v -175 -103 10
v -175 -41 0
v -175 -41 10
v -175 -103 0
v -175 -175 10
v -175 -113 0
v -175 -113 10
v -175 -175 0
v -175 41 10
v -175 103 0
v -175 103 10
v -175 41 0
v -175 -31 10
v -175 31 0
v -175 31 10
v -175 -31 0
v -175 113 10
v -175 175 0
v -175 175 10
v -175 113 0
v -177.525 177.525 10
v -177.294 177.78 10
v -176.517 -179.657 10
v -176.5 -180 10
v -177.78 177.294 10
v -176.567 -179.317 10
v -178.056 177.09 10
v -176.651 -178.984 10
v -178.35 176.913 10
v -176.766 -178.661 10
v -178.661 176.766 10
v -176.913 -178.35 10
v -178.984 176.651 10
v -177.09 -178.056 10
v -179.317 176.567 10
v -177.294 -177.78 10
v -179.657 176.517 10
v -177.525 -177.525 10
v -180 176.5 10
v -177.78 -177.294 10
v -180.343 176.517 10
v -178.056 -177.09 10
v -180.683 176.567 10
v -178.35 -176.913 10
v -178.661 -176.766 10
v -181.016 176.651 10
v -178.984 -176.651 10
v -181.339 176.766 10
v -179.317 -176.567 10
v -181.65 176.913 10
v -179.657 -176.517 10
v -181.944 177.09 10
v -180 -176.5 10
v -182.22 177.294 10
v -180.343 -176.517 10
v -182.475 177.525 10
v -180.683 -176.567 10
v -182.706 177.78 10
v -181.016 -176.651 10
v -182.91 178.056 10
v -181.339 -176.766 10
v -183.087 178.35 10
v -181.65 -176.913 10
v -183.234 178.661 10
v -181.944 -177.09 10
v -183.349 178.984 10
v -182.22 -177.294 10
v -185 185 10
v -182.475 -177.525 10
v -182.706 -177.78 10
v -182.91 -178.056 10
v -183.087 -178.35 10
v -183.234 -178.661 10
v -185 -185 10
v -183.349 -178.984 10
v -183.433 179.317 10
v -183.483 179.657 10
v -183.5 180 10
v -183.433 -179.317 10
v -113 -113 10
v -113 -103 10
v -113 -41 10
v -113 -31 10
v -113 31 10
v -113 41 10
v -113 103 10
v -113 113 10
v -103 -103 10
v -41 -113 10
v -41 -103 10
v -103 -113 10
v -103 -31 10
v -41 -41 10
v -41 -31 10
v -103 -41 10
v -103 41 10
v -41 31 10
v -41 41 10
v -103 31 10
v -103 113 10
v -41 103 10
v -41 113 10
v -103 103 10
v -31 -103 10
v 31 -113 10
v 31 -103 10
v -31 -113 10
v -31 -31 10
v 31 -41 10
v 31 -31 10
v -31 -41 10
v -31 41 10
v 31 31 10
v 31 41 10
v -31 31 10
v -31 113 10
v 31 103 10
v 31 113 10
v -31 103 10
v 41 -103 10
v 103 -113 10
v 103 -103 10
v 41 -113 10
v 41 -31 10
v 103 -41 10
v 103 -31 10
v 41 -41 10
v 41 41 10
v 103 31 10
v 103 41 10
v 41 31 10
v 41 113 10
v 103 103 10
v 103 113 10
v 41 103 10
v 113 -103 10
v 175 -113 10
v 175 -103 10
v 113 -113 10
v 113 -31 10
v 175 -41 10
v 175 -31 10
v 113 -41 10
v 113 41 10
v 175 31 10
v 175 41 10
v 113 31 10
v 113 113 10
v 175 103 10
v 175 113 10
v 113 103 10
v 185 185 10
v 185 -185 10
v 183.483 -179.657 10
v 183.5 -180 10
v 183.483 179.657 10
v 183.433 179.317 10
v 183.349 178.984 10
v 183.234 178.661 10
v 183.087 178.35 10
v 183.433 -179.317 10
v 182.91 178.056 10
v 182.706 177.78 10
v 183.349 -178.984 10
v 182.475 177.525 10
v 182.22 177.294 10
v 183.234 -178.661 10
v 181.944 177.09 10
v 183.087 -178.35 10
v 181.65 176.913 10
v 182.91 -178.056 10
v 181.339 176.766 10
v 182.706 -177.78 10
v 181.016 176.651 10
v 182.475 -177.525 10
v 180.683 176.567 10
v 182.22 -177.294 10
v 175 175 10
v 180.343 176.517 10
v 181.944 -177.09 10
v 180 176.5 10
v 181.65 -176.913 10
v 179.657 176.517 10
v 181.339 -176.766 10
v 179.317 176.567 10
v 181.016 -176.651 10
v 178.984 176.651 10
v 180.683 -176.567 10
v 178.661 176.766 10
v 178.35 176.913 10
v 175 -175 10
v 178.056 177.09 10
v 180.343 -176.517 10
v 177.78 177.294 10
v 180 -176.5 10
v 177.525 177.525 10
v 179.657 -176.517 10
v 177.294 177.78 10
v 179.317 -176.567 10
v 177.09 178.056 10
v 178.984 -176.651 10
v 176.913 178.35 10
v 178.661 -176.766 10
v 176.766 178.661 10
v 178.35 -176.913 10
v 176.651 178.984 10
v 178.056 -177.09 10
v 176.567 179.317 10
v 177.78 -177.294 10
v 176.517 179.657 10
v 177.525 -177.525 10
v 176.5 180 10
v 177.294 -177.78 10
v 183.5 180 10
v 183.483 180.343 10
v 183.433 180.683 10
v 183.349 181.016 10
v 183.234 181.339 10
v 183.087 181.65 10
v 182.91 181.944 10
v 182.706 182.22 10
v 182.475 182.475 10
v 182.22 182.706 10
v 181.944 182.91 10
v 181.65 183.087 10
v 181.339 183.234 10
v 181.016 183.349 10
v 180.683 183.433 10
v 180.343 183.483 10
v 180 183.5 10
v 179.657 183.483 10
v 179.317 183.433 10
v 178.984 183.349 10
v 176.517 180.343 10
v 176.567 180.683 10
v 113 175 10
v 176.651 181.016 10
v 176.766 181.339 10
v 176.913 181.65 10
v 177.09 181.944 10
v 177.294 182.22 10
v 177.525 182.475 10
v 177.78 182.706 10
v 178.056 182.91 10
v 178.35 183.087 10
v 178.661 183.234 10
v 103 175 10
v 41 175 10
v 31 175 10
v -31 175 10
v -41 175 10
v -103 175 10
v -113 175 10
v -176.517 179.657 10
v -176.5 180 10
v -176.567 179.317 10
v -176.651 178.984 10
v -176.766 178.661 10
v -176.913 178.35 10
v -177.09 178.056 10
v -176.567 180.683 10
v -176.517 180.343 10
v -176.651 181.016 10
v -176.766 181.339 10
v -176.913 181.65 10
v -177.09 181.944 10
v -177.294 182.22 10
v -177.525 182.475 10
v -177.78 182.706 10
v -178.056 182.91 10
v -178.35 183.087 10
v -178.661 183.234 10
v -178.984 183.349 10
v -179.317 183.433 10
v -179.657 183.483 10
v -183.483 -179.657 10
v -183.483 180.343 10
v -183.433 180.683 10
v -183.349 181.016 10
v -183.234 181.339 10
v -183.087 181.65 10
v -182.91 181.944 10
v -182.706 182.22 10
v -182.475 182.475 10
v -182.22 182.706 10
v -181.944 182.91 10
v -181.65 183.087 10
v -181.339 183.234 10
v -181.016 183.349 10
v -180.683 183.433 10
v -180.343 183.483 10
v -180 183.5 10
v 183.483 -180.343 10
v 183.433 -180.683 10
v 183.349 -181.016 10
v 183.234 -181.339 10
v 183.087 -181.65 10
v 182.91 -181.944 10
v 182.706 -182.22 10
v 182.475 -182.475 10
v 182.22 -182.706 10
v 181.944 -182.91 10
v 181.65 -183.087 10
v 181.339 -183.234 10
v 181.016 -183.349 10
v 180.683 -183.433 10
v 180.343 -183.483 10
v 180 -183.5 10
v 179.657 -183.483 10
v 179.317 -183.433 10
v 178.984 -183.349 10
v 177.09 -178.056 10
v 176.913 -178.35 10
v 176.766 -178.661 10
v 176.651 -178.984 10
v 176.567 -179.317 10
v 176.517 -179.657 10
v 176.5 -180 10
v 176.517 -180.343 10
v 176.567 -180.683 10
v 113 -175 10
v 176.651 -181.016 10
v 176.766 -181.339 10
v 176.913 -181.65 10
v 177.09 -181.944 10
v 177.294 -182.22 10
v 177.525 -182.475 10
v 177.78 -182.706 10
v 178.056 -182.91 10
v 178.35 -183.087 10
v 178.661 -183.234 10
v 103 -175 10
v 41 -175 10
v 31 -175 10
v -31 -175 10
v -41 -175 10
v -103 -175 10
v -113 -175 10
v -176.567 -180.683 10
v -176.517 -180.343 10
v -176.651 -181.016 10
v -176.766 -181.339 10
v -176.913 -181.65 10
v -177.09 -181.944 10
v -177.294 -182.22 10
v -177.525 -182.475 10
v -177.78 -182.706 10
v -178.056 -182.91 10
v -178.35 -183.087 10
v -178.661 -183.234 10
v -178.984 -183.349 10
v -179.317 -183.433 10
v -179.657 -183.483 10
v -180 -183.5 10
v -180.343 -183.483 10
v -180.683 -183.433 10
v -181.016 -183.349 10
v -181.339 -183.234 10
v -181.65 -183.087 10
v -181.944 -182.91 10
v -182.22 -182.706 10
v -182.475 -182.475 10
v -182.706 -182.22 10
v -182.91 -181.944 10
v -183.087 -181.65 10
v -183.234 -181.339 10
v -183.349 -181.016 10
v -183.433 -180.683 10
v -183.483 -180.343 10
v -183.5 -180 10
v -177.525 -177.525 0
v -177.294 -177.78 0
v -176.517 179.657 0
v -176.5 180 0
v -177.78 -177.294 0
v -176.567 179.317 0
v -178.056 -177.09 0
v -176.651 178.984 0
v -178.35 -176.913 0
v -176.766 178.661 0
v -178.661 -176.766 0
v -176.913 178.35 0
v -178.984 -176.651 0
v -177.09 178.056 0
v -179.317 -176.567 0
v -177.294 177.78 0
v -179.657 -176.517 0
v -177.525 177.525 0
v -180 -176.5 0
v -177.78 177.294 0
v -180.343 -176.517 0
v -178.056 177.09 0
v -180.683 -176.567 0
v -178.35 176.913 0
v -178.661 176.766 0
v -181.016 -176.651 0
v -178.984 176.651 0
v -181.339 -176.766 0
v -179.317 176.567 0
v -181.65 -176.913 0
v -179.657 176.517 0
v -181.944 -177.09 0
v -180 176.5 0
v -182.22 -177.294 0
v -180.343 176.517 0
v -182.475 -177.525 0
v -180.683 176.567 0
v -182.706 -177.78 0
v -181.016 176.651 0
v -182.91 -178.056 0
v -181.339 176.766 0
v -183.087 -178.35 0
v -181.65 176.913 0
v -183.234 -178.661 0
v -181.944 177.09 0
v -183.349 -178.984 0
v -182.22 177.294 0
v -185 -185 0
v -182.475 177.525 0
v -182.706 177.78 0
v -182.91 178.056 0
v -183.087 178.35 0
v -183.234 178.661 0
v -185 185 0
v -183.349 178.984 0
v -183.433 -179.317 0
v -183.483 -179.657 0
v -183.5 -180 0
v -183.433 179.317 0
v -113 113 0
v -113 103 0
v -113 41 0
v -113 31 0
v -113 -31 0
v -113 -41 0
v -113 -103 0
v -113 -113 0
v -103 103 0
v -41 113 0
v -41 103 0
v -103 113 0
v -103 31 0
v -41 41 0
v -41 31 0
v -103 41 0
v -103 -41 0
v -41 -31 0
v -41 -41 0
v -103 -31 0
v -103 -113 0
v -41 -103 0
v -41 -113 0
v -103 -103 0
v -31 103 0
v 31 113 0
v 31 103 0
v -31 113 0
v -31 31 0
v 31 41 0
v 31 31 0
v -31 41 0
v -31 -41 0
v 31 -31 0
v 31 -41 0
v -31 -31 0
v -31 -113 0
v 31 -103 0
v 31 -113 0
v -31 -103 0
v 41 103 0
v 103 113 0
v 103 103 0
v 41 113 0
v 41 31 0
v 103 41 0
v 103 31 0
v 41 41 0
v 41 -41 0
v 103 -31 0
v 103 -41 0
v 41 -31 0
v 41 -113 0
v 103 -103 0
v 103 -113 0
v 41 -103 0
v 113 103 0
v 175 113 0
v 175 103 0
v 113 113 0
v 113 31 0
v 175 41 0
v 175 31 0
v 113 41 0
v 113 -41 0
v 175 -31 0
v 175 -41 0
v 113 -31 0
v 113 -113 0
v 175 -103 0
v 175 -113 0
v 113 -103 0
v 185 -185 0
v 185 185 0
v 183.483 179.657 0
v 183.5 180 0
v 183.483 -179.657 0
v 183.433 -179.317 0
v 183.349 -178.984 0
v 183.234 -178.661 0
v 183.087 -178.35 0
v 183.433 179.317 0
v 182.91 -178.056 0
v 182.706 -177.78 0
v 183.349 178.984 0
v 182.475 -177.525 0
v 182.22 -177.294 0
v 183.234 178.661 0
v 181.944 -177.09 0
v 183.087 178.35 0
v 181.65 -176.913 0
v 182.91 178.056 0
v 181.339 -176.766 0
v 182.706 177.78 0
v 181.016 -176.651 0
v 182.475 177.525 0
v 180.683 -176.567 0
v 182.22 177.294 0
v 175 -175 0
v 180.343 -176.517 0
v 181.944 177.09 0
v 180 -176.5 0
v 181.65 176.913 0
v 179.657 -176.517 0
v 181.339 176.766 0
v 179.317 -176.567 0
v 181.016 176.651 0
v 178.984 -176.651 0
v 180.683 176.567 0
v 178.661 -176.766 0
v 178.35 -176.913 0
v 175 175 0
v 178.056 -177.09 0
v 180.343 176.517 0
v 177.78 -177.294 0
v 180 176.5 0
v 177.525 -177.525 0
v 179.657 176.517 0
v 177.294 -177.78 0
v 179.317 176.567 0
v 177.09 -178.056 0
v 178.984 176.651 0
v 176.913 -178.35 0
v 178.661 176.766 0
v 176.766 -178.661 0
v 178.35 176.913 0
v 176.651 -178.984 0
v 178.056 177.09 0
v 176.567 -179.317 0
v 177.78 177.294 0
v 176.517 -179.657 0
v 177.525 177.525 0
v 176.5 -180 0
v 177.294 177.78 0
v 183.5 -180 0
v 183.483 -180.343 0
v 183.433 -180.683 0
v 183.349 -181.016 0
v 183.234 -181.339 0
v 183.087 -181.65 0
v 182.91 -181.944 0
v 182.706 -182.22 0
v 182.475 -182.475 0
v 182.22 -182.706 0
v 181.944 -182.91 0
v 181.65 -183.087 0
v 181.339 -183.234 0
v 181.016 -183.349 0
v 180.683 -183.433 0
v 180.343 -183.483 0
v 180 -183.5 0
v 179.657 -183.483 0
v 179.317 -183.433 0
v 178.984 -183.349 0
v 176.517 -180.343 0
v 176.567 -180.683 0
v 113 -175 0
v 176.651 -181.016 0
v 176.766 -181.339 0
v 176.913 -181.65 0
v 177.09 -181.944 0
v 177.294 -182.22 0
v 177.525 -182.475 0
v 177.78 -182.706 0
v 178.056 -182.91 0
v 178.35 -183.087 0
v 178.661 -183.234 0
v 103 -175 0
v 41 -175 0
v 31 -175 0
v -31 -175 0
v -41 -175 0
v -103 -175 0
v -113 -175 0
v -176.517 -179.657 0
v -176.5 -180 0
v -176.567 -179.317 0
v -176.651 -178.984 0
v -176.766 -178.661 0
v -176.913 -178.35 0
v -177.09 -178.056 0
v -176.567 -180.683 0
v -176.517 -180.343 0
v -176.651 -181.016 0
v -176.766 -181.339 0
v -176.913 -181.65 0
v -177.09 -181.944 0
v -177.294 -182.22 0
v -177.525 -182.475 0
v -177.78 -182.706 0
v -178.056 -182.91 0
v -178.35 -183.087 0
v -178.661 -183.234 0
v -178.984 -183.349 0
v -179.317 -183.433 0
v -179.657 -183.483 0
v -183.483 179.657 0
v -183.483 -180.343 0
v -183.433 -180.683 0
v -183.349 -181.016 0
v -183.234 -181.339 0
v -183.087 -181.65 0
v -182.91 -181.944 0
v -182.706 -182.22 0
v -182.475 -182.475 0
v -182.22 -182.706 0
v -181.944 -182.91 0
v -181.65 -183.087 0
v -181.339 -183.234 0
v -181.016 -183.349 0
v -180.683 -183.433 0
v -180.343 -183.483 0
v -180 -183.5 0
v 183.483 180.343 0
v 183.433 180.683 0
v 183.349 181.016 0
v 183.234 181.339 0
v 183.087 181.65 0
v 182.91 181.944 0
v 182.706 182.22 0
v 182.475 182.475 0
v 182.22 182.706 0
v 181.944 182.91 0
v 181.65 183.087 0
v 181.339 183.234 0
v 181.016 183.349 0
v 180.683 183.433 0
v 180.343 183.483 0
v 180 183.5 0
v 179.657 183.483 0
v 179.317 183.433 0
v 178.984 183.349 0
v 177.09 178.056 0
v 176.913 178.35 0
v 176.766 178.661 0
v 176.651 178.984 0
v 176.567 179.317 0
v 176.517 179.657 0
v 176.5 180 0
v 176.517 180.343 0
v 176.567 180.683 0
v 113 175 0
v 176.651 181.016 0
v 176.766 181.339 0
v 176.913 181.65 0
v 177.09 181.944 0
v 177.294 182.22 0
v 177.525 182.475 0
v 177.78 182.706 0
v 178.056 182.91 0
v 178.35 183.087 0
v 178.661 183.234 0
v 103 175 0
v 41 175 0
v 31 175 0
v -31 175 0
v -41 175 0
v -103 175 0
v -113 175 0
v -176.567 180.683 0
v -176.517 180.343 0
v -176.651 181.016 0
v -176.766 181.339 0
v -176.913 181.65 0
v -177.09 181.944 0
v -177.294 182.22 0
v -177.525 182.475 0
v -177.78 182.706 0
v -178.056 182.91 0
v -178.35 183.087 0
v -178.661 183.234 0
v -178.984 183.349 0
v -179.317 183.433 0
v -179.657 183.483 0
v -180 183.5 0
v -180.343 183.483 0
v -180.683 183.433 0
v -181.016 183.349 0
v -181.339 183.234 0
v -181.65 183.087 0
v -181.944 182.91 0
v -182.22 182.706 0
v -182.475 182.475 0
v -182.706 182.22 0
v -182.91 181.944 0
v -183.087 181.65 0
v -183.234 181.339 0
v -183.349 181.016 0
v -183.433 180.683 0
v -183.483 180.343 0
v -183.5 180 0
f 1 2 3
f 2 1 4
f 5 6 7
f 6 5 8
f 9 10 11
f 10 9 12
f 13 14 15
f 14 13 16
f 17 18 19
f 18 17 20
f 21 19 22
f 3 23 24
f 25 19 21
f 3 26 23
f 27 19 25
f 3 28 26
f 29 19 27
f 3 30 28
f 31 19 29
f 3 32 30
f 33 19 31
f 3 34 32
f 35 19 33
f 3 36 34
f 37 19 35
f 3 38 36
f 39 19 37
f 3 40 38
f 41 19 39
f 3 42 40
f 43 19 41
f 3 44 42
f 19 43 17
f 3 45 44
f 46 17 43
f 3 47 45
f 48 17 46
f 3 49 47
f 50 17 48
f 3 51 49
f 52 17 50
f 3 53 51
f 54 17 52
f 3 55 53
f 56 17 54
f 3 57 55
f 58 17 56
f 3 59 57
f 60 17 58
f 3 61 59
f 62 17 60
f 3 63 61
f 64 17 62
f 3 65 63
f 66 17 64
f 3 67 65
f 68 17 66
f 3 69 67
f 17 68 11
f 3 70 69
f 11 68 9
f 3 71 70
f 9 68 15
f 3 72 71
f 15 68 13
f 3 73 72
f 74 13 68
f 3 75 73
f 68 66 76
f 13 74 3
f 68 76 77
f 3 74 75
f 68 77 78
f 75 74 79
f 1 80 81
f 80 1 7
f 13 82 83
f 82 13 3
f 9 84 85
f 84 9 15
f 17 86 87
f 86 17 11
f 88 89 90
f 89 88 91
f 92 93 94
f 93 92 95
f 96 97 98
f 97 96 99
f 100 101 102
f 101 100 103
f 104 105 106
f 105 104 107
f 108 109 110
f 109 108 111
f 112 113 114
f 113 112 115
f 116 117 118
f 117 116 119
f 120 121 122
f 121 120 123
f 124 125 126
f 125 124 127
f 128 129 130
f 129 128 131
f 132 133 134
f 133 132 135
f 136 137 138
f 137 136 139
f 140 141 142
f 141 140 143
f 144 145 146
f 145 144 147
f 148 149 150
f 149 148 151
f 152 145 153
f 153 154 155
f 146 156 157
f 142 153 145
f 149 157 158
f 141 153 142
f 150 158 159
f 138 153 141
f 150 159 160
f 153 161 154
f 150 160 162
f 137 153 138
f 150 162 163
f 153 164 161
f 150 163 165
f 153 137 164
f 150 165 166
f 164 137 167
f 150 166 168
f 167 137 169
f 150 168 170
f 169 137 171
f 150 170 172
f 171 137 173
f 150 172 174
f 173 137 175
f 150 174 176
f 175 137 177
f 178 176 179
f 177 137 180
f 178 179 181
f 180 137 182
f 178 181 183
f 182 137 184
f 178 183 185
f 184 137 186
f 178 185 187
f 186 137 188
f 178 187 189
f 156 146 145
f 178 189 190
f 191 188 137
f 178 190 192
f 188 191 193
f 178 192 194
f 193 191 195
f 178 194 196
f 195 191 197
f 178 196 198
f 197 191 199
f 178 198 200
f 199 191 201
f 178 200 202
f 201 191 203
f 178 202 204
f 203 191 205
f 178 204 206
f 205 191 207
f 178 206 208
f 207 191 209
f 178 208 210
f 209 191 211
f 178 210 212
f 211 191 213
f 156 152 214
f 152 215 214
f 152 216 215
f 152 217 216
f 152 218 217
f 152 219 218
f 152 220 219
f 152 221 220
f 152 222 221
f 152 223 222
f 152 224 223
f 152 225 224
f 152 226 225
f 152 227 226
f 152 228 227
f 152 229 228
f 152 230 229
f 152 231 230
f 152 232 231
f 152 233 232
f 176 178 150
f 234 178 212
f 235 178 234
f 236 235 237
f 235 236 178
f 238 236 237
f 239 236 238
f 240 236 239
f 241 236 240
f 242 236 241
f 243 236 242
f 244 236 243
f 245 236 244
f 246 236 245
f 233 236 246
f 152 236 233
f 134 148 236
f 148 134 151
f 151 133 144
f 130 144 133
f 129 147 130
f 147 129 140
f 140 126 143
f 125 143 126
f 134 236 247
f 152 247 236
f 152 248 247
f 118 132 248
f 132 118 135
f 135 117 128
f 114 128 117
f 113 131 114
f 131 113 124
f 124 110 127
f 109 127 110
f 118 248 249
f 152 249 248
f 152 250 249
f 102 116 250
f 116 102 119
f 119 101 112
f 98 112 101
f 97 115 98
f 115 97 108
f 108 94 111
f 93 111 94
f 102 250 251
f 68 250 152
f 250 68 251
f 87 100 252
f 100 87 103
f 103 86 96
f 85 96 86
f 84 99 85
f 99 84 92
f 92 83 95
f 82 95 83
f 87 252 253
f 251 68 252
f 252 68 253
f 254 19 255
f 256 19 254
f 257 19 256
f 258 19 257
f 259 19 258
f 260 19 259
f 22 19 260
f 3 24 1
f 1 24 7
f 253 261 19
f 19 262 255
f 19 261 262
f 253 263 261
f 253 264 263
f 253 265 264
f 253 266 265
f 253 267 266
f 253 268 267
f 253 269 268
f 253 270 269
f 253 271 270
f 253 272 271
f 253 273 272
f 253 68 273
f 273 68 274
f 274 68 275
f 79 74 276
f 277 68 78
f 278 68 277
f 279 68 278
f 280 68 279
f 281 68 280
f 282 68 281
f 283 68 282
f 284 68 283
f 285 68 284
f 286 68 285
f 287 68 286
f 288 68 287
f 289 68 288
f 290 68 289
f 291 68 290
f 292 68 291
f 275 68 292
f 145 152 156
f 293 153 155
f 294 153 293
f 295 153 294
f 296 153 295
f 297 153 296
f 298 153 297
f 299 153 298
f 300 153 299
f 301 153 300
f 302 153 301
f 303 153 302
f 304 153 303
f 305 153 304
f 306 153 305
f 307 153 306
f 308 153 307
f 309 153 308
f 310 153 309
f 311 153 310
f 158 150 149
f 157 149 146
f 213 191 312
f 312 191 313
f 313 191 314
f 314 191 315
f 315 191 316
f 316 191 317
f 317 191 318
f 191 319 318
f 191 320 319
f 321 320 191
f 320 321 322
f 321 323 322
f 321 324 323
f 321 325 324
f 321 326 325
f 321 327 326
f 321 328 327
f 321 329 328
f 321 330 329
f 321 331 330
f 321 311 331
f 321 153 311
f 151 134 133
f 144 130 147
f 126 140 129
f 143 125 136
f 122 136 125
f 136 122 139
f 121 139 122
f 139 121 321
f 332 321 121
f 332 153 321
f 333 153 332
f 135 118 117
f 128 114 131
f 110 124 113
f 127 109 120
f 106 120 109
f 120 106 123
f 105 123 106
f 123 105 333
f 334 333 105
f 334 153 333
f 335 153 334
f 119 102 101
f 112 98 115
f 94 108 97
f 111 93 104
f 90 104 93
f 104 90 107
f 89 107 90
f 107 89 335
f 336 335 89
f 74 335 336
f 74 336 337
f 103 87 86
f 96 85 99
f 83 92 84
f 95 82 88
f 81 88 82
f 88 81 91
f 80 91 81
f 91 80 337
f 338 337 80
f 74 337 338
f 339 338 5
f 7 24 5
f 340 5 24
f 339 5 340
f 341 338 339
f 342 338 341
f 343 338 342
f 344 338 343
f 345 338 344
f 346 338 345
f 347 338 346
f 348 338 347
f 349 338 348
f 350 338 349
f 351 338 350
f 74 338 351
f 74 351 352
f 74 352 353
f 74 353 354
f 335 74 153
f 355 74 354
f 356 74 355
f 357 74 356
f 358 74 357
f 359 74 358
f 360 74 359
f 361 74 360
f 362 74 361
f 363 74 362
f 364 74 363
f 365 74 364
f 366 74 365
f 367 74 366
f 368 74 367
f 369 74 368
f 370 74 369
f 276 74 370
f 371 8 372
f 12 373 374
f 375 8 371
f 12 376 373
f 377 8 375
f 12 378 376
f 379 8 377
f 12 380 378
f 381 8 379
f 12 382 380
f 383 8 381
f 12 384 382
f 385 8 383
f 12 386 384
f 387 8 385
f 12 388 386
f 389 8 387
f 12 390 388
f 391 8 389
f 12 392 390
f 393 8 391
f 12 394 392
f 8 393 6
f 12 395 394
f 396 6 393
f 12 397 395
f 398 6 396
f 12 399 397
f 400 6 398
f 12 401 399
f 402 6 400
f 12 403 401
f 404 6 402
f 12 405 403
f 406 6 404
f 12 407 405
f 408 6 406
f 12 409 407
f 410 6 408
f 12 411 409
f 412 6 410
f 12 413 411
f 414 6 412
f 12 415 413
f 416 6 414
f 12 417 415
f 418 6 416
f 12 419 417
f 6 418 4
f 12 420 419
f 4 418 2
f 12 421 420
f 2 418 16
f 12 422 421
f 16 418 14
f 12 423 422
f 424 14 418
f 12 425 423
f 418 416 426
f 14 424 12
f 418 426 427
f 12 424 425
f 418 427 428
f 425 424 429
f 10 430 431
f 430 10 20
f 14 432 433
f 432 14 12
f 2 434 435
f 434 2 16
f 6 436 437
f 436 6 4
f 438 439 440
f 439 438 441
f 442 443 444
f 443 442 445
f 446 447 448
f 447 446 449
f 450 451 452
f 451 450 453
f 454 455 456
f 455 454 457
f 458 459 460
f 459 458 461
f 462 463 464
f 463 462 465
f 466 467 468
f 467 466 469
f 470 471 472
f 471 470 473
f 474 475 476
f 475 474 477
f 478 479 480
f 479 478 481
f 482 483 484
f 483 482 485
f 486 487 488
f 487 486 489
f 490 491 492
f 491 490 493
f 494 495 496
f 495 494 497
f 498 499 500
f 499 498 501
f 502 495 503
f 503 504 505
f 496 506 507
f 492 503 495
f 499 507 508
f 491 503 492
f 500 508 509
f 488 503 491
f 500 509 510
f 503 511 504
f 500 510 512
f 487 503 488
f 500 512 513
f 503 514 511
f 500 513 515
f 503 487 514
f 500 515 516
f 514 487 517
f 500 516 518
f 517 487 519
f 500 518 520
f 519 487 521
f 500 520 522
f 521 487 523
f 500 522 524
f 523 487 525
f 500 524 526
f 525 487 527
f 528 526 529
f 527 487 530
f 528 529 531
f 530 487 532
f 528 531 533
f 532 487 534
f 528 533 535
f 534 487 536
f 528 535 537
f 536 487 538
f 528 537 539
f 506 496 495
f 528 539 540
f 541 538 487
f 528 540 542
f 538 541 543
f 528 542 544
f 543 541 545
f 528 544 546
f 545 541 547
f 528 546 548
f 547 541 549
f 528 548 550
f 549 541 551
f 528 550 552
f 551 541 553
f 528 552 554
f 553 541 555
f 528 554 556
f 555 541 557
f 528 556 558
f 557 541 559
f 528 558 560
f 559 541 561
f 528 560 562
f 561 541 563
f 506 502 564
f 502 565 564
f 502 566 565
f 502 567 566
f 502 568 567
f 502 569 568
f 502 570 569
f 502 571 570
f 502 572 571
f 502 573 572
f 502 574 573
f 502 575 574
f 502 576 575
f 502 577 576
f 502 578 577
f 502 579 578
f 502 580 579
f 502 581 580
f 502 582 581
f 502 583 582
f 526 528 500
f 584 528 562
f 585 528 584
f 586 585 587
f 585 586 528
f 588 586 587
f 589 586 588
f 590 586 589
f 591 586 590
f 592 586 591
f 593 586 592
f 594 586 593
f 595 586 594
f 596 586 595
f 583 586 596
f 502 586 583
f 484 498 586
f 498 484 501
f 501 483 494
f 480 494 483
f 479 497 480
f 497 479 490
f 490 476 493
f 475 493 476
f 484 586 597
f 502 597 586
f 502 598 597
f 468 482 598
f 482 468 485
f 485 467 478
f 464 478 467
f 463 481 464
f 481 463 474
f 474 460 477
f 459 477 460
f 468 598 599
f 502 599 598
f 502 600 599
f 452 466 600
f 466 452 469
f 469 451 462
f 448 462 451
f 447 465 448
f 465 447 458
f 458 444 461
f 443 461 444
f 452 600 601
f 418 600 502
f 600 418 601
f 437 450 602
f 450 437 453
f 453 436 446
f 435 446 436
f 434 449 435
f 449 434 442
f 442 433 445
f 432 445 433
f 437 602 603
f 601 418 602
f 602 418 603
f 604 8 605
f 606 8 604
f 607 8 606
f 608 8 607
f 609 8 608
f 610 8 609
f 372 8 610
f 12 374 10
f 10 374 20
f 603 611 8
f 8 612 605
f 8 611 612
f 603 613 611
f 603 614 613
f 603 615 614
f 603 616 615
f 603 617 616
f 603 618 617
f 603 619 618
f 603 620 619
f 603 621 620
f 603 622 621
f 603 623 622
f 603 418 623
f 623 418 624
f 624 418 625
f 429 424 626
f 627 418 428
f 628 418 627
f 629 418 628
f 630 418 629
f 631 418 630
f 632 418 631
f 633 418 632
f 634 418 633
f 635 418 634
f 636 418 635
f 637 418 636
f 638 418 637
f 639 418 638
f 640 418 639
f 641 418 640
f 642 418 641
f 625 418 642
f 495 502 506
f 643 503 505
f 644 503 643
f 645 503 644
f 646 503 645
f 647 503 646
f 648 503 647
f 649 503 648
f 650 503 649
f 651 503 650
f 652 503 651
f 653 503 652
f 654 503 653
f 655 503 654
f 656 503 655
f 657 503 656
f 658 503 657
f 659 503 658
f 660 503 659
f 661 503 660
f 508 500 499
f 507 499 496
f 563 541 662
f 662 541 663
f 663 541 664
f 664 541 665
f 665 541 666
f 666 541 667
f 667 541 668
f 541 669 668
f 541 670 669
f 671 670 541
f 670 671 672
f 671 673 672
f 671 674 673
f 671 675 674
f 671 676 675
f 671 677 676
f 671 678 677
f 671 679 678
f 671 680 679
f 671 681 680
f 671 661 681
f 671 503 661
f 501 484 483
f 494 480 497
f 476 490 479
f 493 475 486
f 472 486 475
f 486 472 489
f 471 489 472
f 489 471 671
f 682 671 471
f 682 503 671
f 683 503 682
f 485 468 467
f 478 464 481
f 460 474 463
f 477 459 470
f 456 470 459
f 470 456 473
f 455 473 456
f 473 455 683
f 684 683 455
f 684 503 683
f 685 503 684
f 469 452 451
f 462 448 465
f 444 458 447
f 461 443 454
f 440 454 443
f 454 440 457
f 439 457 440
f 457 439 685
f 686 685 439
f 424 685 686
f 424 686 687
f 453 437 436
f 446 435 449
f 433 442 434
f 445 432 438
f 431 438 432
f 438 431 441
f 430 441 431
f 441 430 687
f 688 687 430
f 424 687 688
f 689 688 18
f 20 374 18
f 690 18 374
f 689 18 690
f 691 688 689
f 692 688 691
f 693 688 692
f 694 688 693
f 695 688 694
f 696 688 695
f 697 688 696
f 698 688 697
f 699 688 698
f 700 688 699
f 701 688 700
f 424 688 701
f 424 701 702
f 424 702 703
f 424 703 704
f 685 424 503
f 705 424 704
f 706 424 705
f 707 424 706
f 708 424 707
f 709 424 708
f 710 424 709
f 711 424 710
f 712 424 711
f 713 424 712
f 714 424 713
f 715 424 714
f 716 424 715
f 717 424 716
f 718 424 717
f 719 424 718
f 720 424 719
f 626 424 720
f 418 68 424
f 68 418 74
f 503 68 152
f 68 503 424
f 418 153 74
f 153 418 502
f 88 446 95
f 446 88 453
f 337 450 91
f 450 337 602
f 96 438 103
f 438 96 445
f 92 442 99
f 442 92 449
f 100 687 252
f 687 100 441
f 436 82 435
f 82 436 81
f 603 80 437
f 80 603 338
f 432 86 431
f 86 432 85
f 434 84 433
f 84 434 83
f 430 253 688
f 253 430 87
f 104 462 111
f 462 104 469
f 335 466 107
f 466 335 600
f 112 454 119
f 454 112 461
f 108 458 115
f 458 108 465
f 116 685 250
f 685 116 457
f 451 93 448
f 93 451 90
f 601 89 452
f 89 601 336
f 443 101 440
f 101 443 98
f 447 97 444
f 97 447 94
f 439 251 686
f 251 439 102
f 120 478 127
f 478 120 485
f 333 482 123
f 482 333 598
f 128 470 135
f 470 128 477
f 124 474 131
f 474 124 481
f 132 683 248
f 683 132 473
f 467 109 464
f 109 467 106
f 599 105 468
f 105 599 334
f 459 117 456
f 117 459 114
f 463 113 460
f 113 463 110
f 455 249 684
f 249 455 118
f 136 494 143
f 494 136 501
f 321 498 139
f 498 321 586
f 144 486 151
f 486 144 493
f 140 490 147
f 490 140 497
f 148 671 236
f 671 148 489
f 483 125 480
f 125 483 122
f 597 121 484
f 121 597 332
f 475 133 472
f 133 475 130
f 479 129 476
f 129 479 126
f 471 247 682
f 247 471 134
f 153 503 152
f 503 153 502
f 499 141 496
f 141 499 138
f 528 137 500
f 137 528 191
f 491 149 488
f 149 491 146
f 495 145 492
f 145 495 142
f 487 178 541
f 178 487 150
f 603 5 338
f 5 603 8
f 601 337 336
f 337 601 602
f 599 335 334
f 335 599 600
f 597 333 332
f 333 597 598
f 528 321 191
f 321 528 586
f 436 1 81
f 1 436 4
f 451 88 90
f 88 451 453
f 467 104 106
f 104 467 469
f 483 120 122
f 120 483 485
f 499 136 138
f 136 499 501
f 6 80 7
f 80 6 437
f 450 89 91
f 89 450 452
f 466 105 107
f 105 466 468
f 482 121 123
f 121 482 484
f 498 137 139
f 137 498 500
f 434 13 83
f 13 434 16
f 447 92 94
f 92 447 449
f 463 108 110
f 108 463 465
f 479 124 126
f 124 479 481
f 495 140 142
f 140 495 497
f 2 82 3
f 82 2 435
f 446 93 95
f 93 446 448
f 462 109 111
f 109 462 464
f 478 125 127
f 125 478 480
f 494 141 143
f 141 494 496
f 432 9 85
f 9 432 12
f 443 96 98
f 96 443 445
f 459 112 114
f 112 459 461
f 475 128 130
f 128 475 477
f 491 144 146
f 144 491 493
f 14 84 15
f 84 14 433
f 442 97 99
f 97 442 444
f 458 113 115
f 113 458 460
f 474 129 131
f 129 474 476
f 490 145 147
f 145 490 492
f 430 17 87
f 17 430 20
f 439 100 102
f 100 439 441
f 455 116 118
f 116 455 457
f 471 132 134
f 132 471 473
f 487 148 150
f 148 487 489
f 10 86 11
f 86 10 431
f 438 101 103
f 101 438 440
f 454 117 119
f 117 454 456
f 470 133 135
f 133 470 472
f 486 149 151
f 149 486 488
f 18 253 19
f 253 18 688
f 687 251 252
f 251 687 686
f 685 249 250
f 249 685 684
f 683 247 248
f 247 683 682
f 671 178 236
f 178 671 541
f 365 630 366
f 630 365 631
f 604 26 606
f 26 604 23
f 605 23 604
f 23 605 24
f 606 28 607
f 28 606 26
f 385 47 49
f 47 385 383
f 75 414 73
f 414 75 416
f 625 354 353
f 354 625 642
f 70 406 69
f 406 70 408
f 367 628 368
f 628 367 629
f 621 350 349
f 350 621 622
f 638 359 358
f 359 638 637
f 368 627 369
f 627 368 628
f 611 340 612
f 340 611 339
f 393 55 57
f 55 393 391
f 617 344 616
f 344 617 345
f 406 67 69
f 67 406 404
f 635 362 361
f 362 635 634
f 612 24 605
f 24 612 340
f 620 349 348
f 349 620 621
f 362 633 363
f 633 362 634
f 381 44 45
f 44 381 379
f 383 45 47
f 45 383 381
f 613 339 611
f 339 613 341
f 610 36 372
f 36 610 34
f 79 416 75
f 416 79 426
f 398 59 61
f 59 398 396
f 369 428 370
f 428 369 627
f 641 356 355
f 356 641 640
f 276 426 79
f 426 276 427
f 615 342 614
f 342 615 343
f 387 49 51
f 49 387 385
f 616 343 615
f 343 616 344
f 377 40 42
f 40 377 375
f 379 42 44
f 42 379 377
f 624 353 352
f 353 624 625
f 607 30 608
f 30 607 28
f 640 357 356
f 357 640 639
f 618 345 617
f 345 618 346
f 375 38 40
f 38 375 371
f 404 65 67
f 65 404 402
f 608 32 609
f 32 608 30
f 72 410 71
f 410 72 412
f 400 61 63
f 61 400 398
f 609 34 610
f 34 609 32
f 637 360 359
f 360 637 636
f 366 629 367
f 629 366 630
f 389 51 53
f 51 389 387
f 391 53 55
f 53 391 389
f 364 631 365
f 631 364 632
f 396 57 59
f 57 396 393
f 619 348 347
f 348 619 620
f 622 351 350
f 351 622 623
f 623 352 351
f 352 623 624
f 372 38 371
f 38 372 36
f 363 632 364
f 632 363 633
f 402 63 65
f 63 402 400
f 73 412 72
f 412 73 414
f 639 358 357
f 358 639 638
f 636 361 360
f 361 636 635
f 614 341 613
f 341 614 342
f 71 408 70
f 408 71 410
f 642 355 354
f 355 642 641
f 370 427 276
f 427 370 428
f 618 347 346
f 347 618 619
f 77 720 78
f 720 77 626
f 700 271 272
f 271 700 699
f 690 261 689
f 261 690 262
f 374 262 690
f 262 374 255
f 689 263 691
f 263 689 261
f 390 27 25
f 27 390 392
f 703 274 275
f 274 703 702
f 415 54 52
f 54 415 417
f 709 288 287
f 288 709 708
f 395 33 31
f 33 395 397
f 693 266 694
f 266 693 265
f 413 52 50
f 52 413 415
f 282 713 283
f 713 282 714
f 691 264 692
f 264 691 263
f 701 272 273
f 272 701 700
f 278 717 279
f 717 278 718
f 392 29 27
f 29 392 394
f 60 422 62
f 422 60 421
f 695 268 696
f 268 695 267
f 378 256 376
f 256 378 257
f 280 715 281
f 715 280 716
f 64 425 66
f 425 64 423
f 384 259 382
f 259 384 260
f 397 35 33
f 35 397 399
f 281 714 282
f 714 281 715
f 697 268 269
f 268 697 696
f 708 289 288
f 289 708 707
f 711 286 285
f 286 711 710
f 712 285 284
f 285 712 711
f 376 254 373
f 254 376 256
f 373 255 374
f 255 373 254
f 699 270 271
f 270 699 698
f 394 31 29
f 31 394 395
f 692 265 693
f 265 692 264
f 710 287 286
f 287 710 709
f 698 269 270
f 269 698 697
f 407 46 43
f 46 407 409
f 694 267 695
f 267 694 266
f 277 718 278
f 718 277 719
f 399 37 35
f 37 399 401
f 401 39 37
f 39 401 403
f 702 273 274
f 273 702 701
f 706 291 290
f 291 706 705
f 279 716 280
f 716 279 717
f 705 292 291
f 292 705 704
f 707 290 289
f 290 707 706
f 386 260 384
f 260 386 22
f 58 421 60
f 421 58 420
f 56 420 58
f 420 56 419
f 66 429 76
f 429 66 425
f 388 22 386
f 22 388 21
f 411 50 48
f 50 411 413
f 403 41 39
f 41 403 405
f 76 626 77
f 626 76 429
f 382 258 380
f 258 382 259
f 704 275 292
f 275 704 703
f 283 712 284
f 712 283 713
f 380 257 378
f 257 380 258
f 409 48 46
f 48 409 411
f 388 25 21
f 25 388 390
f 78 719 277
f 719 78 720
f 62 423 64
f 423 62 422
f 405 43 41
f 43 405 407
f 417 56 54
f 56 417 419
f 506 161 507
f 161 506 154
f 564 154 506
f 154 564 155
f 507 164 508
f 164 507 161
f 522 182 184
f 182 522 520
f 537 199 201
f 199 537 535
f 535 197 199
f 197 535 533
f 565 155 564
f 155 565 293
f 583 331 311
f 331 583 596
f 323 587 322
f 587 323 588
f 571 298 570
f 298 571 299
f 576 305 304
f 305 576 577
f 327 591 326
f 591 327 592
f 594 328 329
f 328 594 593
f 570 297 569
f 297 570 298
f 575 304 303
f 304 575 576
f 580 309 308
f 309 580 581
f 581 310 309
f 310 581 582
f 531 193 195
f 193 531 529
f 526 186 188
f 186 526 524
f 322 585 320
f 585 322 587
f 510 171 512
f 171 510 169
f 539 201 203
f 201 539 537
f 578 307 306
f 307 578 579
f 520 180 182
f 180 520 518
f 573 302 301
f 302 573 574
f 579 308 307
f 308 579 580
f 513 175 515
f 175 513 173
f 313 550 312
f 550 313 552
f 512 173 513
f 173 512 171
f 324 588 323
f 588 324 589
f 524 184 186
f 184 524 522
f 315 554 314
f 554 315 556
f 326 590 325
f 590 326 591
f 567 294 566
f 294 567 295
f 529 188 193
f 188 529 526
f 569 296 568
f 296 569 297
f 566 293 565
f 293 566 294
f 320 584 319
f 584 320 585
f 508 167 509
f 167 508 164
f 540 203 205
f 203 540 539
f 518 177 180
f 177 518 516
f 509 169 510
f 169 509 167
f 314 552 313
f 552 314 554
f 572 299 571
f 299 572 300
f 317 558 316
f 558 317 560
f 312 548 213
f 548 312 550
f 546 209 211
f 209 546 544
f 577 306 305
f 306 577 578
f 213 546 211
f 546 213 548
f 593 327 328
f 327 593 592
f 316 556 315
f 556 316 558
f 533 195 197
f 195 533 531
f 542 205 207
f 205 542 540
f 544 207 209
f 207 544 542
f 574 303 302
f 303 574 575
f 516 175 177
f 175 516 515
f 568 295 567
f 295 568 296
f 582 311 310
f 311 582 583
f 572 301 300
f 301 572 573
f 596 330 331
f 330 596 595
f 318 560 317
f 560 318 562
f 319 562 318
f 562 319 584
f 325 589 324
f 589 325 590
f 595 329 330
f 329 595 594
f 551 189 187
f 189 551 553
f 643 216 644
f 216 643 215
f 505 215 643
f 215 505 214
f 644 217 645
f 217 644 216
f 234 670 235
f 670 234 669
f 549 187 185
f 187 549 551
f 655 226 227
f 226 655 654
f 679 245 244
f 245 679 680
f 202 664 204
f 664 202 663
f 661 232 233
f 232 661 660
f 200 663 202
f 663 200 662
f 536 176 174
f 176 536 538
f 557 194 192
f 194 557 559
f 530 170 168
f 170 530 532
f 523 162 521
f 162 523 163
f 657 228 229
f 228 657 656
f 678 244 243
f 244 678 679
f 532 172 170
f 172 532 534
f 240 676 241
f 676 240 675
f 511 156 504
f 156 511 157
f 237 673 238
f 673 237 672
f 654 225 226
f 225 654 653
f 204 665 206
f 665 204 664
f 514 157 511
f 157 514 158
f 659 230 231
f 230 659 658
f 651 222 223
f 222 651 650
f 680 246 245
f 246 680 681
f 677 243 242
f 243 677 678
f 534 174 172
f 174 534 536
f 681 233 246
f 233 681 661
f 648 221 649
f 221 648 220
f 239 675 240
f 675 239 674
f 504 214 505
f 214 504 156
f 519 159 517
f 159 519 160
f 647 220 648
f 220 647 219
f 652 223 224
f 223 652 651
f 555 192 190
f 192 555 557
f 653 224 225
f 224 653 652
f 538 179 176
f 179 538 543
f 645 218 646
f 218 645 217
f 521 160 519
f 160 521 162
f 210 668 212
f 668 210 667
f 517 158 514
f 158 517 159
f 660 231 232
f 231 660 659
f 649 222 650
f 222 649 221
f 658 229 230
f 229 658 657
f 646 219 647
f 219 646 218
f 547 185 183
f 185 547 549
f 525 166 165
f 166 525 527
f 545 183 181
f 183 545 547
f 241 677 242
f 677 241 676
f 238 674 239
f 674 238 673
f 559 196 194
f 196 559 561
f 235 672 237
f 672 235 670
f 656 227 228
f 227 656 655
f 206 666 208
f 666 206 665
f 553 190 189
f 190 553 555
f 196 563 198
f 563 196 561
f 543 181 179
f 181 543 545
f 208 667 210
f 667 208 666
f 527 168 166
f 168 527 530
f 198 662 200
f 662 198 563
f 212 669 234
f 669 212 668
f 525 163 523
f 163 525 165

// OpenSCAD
bar=10;gap=62;W=370;hole_d=7;$fn=64;difference(){union(){for(i=[0:5])let(x=-W/2+i*(bar+gap))translate([x,-W/2,0])cube([bar,W,bar]);for(i=[0:5])let(y=-W/2+i*(bar+gap))translate([-W/2,y,0])cube([W,bar,bar]);}for(cx=[-W/2+bar/2,W/2-bar/2])for(cy=[-W/2+bar/2,W/2-bar/2])translate([cx,cy,-1])cylinder(h=bar+2,d=hole_d);}
